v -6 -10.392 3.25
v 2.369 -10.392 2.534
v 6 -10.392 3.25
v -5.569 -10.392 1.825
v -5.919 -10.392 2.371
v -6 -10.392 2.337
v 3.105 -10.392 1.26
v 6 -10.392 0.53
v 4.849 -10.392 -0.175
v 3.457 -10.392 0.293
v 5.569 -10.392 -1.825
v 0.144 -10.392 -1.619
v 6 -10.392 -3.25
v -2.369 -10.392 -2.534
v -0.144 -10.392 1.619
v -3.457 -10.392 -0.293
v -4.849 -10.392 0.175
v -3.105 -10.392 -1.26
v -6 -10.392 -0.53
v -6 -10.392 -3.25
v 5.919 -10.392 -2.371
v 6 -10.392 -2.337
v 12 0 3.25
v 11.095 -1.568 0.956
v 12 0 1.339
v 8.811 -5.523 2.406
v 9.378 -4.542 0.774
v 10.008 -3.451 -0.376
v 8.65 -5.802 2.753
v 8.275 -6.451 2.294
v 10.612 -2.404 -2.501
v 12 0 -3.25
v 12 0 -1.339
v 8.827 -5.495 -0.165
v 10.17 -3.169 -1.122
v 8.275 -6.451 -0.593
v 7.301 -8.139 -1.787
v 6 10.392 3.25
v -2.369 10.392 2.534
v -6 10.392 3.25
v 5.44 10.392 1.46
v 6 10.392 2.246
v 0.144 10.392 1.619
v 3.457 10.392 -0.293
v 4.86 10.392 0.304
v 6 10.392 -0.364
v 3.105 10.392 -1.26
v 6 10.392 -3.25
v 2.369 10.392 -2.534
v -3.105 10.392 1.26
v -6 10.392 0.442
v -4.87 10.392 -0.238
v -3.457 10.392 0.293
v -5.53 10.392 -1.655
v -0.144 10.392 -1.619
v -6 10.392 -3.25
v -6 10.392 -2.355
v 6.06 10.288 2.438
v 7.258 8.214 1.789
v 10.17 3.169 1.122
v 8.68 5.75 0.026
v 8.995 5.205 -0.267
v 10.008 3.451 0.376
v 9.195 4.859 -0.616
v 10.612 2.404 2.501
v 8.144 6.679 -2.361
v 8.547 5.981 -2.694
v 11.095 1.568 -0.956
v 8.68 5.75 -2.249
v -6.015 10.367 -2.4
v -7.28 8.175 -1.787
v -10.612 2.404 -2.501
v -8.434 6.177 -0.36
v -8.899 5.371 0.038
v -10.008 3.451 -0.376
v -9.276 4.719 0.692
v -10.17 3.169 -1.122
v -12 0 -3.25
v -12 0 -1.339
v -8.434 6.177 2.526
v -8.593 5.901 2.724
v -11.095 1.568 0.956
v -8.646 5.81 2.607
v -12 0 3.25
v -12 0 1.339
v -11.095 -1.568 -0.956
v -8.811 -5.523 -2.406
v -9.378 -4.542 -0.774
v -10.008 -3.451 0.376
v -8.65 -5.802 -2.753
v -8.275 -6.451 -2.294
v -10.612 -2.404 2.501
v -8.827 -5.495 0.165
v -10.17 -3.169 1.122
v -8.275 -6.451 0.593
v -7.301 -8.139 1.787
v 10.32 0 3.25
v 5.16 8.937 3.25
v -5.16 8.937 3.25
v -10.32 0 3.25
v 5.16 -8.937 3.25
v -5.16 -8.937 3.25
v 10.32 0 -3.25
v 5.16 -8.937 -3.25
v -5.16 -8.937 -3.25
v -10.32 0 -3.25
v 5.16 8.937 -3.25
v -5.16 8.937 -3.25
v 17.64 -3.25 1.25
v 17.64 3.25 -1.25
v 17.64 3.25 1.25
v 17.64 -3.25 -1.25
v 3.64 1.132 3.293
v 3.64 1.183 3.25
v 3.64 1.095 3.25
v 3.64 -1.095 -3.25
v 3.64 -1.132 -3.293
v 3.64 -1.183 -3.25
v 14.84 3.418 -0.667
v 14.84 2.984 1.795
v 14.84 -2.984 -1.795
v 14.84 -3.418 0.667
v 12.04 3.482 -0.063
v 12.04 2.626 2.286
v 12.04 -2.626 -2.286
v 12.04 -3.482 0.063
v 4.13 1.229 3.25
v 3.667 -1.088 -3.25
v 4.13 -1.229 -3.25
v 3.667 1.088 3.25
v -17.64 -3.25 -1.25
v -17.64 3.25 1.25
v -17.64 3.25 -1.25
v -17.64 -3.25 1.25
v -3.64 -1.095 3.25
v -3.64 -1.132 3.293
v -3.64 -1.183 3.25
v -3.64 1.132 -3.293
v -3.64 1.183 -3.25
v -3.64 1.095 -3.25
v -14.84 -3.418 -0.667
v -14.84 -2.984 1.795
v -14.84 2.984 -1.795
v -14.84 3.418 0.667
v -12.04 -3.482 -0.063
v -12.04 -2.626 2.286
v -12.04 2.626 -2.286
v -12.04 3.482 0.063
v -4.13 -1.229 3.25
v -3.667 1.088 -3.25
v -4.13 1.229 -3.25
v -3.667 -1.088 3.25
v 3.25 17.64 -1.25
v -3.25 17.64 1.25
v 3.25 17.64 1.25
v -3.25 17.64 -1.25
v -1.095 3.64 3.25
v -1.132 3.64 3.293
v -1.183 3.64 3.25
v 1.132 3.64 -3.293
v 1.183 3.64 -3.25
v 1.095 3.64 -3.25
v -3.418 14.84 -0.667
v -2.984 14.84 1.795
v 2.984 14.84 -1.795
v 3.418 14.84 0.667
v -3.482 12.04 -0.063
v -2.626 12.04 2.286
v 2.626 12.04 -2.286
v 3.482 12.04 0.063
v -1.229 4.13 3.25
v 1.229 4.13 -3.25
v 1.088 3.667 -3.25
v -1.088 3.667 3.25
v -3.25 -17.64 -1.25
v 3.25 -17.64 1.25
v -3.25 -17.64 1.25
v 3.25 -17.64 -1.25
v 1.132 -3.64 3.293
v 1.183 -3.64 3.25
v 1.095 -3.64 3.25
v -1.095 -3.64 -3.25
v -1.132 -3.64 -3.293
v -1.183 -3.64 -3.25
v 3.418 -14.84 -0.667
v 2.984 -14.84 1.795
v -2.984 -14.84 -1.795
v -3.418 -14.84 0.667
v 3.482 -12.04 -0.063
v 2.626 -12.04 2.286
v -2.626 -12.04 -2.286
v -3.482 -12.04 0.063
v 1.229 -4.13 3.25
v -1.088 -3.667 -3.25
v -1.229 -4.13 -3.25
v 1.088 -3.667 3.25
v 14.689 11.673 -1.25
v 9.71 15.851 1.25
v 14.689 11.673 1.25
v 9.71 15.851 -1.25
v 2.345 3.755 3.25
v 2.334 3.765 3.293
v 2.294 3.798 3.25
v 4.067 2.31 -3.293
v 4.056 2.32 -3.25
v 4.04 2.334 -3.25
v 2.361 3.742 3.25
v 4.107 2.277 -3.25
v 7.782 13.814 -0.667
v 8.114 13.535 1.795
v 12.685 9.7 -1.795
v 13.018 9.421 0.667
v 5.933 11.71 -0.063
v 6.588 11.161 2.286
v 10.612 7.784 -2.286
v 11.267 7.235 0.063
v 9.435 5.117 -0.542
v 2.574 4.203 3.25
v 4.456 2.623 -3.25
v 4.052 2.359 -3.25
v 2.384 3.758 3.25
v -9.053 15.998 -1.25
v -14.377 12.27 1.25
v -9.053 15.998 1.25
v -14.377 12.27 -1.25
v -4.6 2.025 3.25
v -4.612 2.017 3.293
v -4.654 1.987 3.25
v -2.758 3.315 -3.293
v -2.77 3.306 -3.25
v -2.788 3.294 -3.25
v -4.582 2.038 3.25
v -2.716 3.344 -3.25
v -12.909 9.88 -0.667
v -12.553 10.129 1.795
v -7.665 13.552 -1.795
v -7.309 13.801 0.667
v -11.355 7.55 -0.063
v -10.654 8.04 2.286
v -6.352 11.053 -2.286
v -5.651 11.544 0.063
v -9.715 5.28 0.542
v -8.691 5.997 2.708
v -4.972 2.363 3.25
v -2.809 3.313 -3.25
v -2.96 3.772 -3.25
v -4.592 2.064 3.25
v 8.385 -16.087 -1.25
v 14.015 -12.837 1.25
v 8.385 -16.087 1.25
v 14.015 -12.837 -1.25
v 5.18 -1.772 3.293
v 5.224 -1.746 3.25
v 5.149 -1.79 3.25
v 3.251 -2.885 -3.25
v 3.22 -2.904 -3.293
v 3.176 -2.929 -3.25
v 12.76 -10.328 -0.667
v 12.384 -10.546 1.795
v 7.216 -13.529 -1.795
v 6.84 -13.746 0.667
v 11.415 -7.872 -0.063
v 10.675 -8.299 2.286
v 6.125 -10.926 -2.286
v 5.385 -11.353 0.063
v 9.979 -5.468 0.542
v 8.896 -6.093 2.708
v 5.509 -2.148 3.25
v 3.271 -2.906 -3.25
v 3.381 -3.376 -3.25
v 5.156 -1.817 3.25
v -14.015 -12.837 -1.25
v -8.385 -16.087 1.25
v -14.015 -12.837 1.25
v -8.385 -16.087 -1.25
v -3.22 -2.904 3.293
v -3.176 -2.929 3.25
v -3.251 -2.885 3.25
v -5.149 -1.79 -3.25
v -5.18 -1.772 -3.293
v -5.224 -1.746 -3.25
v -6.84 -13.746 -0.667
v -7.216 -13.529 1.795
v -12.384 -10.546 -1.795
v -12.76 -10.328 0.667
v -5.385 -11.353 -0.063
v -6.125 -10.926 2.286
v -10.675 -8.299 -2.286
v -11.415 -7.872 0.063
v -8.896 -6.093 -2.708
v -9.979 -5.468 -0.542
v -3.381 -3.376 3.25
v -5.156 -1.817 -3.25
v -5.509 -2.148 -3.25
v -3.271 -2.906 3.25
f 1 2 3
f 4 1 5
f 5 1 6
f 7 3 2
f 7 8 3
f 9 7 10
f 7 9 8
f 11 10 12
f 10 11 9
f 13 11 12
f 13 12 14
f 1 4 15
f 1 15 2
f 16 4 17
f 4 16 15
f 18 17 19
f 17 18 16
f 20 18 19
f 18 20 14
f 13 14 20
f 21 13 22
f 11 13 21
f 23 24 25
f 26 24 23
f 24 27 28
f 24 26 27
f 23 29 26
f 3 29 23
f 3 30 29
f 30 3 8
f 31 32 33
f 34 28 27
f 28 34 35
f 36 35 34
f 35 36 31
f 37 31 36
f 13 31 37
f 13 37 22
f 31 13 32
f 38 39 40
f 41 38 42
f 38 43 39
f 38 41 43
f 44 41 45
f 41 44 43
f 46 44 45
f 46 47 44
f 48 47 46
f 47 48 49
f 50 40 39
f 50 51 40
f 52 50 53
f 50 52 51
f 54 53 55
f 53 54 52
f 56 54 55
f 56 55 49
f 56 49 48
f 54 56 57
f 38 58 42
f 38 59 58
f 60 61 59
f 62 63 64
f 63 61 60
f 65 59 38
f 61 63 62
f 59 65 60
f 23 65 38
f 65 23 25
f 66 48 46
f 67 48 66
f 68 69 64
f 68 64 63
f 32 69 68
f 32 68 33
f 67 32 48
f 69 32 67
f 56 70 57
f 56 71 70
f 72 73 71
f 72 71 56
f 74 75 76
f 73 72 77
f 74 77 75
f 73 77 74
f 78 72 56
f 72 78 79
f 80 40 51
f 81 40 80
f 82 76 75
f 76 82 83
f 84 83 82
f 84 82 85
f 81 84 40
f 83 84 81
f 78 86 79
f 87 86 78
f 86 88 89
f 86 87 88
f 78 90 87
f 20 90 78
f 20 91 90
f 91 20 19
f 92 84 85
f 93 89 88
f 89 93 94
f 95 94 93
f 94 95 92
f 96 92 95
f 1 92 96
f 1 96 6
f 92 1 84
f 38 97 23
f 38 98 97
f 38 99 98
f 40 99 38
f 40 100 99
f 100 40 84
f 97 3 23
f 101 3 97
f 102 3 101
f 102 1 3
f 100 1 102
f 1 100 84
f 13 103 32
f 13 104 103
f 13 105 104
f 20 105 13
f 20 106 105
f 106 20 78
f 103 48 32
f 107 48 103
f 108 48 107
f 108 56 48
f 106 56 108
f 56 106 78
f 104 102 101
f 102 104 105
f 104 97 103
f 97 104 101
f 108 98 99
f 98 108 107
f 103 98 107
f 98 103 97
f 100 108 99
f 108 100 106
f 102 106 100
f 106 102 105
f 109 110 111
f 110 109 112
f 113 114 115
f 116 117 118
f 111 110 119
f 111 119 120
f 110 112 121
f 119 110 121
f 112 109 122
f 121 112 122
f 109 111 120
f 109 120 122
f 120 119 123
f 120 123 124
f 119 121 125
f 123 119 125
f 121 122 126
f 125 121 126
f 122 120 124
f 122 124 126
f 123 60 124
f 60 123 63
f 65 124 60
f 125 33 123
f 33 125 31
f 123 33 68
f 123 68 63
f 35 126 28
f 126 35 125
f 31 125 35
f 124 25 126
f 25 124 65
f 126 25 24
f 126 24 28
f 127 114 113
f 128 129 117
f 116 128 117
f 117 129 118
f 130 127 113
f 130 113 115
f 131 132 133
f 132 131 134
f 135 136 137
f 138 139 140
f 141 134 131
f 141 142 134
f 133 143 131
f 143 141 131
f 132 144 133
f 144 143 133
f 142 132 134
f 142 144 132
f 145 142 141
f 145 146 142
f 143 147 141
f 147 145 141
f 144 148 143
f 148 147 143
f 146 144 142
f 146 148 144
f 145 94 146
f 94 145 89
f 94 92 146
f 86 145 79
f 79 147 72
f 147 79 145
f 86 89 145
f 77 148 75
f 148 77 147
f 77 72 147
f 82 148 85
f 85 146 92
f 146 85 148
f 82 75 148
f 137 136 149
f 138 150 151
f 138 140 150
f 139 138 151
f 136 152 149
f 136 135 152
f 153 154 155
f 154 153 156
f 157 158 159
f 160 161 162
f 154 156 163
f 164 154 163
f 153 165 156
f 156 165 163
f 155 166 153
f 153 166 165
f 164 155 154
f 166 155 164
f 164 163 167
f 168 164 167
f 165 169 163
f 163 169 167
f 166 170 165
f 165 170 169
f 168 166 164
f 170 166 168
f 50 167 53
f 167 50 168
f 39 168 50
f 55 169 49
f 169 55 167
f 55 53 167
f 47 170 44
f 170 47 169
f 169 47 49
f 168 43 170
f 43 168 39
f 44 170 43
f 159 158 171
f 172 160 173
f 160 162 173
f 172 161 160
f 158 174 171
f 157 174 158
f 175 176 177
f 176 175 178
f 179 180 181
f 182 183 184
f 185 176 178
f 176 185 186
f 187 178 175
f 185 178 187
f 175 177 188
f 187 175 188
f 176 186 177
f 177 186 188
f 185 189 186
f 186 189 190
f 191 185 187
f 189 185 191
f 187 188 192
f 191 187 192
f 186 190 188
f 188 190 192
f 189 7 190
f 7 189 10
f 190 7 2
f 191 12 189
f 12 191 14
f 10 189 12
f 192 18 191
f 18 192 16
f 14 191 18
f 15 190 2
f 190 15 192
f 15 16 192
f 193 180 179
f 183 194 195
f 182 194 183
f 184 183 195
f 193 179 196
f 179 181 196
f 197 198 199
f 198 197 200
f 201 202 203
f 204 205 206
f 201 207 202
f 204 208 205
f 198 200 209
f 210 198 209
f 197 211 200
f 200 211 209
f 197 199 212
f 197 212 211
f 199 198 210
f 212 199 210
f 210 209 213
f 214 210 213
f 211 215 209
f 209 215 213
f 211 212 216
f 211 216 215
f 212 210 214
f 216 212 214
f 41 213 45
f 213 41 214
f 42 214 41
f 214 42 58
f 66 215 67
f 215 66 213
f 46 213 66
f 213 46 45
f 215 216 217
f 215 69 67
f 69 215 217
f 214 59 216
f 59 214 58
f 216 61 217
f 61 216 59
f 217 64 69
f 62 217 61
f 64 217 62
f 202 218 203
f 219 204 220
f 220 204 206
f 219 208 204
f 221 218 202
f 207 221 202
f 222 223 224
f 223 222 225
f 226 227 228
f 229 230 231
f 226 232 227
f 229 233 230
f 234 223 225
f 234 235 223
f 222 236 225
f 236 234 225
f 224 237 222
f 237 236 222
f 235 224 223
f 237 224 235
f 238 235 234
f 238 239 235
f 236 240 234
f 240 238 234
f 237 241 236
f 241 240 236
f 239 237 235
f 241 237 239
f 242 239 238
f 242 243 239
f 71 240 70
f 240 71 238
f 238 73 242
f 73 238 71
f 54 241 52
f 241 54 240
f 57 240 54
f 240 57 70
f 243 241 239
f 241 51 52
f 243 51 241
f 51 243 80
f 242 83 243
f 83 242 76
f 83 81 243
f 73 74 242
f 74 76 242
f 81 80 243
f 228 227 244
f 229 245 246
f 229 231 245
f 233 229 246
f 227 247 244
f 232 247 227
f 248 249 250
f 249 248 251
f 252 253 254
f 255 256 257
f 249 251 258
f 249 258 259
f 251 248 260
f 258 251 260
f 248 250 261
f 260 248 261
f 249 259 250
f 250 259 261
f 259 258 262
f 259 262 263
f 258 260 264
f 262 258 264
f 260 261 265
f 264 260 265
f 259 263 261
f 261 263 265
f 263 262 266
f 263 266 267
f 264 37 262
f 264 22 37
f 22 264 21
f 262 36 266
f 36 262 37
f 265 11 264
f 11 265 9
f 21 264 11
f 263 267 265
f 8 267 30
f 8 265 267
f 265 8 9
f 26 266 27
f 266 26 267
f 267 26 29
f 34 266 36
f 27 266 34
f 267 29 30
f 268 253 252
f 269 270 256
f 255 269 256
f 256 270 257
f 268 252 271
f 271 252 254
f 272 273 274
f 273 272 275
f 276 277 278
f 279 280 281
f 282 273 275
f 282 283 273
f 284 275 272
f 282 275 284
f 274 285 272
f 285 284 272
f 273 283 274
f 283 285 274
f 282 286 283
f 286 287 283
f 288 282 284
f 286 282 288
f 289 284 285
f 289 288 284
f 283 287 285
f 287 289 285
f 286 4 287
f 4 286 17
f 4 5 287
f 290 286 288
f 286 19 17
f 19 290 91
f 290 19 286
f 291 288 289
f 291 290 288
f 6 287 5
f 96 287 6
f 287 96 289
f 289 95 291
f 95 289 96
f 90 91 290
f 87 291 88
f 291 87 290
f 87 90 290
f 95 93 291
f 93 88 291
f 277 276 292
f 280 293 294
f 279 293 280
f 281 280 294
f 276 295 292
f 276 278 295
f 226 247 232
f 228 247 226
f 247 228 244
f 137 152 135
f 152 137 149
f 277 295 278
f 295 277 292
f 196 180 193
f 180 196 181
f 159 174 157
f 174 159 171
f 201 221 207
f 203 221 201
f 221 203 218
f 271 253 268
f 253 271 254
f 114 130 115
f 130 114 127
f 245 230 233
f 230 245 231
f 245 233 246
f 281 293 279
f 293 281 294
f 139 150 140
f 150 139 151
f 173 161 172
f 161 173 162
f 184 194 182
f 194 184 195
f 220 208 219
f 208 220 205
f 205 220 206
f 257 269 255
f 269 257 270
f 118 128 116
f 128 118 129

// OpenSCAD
spindleD = 24;
spindleH = 6.5;
bladeLength = 14;

module spindle() {
difference() {
    cylinder(d=spindleD, h= spindleH, $fn=6, center=true);
    cylinder(d=spindleD*0.86, h= spindleH*2, $fn=6, center=true);
    }
}

module fanBlade() {
linear_extrude(height = bladeLength, center = true, convexity = 10, twist = 50) square([2.5, spindleH], center=true);
}

module fanBlades() {
union() {
spindle();
translate([bladeLength*0.76,0,0])rotate(a=[0,90,180]) fanBlade();
translate([-bladeLength*0.76,0,0])rotate(a=[0,90,0]) fanBlade();
translate([0,bladeLength*0.76,0])rotate(a=[90,90,0]) fanBlade();
translate([0,-bladeLength*0.76,0])rotate(a=[90,90,180]) fanBlade();
    
// middle blades

translate([bladeLength*0.55,bladeLength*0.6,0])rotate(a=[-50,90,180]) fanBlade();
translate([-bladeLength*0.55,bladeLength*0.6,0])rotate(a=[55,90,0]) fanBlade();
translate([bladeLength*0.55,-bladeLength*0.6,0])rotate(a=[60,90,180]) fanBlade();
translate([-bladeLength*0.55,-bladeLength*0.6,0])rotate(a=[-60,90,0]) fanBlade();
    
/*    
translate([-bladeLength*0.76,0,0])rotate(a=[0,90,0]) fanBlade();
translate([0,bladeLength*0.76,0])rotate(a=[90,90,0]) fanBlade();
translate([0,-bladeLength*0.76,0])rotate(a=[90,90,180]) fanBlade();    
    
    */
    }
}

module fan() {
difference() {
    fanBlades();
    cylinder(d=spindleD*0.86, h= spindleH, $fn=6, center=true);
    }
}

fan();
    
